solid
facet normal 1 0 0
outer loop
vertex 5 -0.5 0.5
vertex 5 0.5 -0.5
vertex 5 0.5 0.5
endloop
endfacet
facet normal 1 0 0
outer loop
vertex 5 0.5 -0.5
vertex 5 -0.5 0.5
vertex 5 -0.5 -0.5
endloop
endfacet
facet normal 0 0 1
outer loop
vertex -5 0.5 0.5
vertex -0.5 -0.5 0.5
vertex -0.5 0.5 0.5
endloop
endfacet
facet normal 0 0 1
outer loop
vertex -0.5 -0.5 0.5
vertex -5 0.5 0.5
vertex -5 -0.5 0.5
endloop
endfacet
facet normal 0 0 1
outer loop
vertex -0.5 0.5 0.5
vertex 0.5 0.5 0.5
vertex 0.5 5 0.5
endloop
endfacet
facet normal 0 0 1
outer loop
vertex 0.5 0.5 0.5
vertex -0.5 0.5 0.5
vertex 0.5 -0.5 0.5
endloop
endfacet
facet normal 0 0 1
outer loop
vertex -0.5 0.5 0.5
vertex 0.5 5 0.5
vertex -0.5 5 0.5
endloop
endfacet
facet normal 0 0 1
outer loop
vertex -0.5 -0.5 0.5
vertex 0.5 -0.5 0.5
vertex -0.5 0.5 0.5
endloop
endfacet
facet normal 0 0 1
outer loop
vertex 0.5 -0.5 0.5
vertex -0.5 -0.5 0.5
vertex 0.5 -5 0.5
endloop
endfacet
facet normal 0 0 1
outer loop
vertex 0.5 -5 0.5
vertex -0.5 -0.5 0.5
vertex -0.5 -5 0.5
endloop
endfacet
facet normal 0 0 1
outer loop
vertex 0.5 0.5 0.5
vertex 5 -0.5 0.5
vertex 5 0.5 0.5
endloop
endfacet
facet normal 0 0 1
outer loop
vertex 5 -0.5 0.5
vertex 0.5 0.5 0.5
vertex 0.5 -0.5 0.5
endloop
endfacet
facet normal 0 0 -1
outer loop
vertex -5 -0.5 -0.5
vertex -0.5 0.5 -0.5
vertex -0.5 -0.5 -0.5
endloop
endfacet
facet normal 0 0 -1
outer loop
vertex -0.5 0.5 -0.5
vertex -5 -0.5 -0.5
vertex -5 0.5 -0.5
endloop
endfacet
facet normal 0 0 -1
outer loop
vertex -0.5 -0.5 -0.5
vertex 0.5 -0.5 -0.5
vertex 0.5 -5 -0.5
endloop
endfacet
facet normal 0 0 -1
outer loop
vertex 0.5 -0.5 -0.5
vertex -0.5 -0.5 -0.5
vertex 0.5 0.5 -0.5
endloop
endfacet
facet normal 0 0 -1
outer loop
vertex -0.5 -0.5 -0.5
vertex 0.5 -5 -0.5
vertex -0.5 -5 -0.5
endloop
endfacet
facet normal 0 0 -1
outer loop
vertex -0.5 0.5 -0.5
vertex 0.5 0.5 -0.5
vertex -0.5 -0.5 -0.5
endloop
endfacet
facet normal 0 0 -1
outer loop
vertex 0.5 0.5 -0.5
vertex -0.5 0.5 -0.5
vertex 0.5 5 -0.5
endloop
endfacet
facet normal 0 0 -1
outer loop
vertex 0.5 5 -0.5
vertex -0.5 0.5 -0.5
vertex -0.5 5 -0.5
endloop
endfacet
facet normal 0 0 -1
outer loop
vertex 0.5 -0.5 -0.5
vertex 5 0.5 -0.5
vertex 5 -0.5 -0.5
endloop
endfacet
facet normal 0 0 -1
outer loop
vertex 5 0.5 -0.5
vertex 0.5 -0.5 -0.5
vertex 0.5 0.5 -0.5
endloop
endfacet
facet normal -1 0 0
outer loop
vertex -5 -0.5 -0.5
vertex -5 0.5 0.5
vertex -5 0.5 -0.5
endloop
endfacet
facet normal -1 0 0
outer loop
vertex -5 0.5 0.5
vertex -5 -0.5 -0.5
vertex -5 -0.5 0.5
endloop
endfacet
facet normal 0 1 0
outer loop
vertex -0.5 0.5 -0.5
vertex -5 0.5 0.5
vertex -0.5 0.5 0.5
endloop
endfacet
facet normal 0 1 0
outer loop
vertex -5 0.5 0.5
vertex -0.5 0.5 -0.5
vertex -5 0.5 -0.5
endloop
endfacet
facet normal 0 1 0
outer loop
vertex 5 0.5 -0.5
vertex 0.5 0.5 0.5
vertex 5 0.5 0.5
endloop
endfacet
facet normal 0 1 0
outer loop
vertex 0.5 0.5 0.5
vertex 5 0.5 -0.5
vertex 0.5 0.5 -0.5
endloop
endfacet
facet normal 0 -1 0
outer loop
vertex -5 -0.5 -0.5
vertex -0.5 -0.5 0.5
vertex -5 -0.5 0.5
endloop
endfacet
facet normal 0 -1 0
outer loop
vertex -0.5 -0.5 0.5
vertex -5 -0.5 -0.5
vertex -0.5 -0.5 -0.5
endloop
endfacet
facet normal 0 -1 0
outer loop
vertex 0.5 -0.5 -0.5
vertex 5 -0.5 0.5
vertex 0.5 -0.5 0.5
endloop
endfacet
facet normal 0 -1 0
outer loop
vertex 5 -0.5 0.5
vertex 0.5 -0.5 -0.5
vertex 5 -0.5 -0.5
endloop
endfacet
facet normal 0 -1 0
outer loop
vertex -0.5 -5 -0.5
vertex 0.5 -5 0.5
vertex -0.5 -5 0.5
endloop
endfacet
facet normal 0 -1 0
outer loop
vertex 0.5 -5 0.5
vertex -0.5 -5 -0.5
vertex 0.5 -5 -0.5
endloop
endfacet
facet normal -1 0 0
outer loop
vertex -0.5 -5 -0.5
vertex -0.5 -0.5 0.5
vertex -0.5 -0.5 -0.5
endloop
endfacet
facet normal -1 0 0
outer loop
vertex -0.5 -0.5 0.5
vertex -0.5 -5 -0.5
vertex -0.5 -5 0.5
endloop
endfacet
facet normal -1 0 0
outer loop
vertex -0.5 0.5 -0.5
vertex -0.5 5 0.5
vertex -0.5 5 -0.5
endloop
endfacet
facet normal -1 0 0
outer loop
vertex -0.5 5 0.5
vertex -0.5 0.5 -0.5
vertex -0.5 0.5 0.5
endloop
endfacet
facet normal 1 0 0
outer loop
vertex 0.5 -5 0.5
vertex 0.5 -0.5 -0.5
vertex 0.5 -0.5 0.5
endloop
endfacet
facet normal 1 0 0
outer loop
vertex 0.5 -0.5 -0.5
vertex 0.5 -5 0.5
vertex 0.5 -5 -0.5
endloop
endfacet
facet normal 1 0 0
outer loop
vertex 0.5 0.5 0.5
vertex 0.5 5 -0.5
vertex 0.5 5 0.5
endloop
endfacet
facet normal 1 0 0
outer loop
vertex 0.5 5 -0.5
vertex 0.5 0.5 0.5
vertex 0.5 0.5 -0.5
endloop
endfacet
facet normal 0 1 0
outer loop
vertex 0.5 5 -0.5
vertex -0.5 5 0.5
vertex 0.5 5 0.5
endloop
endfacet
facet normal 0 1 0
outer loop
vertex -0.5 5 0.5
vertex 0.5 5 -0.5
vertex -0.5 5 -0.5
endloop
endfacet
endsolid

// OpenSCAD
cube([10,1,1], center=true);
rotate([0,0,90])
  cube([10,1,1], center=true);
